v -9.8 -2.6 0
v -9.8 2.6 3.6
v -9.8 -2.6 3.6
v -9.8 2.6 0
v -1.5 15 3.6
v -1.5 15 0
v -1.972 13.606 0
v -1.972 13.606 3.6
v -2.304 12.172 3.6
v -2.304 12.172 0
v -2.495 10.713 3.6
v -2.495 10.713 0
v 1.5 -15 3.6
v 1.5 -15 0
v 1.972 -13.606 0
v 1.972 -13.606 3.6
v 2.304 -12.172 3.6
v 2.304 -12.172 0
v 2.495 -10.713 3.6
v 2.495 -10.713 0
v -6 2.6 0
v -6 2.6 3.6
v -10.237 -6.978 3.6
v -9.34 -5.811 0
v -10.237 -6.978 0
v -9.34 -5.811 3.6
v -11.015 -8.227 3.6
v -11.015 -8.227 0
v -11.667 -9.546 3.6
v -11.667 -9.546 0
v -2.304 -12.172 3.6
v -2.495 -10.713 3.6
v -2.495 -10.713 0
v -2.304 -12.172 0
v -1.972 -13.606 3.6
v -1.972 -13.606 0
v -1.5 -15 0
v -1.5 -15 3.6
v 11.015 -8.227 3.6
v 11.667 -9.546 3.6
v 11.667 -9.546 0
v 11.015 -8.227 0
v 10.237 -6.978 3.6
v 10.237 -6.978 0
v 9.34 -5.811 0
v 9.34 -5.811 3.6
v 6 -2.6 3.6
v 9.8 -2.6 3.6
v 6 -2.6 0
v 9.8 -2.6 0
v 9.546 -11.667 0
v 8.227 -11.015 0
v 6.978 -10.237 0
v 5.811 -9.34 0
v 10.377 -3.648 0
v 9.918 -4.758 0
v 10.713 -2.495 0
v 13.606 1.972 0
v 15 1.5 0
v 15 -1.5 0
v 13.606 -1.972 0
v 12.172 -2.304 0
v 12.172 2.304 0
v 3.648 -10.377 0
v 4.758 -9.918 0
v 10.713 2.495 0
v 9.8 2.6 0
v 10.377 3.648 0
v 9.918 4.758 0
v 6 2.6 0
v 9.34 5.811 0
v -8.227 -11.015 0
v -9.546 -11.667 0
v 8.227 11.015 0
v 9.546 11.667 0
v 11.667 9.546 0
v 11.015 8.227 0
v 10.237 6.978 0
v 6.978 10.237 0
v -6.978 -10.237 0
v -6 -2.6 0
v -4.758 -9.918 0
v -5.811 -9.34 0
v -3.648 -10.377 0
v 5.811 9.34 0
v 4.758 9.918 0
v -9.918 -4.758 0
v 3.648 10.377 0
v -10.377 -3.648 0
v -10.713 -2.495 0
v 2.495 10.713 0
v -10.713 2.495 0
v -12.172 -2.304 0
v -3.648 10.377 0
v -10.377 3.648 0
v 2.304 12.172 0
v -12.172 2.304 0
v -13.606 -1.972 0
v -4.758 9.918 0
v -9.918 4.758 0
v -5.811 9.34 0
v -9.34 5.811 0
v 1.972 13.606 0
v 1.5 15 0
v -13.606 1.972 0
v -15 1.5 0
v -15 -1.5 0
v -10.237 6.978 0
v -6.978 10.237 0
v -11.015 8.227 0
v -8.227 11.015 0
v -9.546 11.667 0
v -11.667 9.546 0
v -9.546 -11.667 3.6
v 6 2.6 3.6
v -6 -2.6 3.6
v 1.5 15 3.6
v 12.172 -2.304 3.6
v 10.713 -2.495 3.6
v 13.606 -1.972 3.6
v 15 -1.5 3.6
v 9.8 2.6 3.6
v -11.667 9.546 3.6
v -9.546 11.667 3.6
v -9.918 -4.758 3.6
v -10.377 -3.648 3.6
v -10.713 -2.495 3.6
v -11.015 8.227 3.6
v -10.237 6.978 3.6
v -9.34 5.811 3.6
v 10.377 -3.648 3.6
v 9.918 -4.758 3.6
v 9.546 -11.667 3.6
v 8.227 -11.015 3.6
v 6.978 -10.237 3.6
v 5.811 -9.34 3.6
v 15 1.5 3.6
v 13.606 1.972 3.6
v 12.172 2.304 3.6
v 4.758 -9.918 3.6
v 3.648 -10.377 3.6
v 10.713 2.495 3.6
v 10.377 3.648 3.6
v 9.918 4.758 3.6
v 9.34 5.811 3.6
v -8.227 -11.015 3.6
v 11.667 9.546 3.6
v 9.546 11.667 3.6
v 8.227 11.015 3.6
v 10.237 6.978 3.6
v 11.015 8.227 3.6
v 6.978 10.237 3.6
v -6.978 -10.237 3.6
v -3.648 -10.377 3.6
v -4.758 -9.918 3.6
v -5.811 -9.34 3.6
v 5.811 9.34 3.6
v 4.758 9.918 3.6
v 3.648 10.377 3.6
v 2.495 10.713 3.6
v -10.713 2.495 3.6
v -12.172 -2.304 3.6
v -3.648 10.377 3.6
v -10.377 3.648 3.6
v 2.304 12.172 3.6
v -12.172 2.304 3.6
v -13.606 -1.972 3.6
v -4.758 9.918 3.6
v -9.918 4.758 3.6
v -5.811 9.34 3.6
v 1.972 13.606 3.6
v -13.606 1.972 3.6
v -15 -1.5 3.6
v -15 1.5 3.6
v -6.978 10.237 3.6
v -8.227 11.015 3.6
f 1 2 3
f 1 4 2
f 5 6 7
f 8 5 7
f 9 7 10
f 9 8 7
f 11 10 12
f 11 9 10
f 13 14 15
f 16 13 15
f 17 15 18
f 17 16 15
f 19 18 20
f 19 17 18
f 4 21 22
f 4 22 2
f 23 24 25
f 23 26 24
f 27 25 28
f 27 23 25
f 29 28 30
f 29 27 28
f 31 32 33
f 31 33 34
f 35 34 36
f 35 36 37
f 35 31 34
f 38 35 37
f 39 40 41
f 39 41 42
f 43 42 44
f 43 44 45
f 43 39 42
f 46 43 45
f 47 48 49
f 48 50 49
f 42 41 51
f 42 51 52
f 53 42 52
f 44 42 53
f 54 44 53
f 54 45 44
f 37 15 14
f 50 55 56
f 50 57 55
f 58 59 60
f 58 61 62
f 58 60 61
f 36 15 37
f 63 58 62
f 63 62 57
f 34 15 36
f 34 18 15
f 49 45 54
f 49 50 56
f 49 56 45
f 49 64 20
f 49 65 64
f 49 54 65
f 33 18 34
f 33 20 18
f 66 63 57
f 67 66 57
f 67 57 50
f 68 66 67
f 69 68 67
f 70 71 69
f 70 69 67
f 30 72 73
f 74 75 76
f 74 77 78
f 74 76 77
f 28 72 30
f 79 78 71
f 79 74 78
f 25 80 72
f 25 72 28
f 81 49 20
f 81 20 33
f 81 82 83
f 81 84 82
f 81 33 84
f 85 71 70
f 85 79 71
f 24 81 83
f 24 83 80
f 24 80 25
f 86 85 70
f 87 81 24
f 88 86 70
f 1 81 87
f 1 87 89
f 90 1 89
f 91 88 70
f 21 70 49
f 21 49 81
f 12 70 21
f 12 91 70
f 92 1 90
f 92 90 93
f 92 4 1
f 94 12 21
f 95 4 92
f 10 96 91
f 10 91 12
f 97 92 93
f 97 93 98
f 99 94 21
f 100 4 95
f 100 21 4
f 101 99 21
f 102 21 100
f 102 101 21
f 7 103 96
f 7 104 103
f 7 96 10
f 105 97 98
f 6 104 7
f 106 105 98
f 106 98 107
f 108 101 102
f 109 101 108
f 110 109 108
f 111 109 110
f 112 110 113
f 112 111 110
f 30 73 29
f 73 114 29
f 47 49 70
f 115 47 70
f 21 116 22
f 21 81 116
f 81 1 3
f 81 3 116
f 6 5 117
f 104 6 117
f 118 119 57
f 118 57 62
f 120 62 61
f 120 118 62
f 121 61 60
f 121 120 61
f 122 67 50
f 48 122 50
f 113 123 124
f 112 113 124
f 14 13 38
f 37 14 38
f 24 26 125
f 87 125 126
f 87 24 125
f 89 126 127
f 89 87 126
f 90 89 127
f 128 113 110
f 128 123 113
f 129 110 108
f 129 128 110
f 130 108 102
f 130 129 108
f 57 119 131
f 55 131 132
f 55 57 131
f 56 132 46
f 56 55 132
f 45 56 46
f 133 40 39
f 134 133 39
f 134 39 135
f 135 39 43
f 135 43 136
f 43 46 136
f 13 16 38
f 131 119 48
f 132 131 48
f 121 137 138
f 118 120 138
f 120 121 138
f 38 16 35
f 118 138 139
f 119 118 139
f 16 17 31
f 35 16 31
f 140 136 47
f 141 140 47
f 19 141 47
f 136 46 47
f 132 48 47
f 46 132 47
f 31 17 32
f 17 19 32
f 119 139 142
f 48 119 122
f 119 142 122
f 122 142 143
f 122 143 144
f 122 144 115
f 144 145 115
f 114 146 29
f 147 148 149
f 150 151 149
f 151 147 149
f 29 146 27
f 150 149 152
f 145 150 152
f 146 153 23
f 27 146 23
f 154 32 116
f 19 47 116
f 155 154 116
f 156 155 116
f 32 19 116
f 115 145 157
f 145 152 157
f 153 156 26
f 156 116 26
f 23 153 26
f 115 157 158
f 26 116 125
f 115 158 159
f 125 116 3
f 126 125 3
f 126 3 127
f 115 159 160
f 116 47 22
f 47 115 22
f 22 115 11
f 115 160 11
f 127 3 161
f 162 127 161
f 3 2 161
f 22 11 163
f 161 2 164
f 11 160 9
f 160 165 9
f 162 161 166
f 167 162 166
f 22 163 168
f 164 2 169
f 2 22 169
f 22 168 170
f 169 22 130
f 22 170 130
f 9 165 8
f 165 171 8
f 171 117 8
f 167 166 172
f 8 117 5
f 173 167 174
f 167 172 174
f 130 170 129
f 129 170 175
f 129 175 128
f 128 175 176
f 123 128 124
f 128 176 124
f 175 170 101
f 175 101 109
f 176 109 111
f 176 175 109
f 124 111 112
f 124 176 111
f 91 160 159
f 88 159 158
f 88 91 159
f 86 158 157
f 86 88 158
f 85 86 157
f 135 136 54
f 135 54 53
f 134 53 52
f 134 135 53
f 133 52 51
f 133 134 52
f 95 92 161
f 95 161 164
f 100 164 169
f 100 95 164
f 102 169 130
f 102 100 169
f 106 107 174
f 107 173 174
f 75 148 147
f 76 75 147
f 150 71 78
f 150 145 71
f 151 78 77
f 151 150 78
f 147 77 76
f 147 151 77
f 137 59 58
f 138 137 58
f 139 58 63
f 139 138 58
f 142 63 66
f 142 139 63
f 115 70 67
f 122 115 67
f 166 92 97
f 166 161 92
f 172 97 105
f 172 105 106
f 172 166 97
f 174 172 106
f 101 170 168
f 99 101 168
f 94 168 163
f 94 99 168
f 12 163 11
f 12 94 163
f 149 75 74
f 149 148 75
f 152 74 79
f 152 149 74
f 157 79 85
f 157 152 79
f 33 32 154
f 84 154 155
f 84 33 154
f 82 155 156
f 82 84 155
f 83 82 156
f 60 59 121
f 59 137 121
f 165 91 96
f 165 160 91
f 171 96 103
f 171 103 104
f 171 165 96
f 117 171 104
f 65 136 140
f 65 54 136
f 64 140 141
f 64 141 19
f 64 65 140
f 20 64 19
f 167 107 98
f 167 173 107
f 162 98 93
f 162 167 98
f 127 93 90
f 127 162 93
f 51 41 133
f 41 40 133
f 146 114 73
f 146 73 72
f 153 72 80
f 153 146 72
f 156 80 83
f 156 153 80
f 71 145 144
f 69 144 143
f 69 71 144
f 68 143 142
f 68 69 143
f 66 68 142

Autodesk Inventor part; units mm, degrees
ref_plane "YZ Plane" through (0, 0, 0) normal (1, 0, 0) x (0, 1, 0)
ref_plane "XZ Plane" through (0, 0, 0) normal (0, 1, 0) x (-1, 0, 0)
ref_plane "XY Plane" through (0, 0, 0) normal (0, 0, 1) x (1, 0, 0)
ref_plane "Work Plane1" through (0, 0, 0) normal (0, 0, -1) x (-1, 0, 0)
sketch "Sketch3" plane through (0, 0, 0) normal (0, 0, -1) x (-1, 0, 0)
  circle A0 centre (0, 0) radius 11
  line L0 (-15.4, 0) -> (15.4, 0) projected
  dimension "d19" = 22
extrude "Extrusion3" add sketch "Sketch3" against normal blind 3.6
sketch "Sketch4" plane through (0, 0, 3.6) normal (0, 0, 1) x (1, 0, 0)
  arc A0 (10.6524, -2.5) -> (10.6524, 2.5) centre (0, 0) ccw
  line L0 (-16.2075, 0) -> (20.2449, 0) projected
  line L1 (15, 0) -> (15, 1.5)
  arc A1 (15, 1.5) -> (10.6524, 2.5) centre (9.5012, -12.4558) ccw
  line L2 (15, 0) -> (15, -1.5)
  arc A2 (10.6524, -2.5) -> (15, -1.5) centre (9.5012, 12.4558) ccw
  dimension "d22" = 1.5
  dimension "d23" = 2.5
  dimension "d24" = 15
  dimension "d25" = 15
extrude "Extrusion4" add sketch "Sketch4" against normal blind 3.6
sketch "Sketch2" plane through (0, 0, 0) normal (0, 0, -1) x (-1, 0, 0)
  line L0 (-9.8, -2.6) -> (-6, -2.6)
  line L1 (-6, -2.6) -> (-6, 2.6)
  line L2 (-6, 2.6) -> (-9.8, 2.6)
  line L3 (-9.8, 2.6) -> (-9.8, -2.6)
  line L4 (-9.8, -2.6) -> (-6, 2.6) construction
  line L5 (-6, -2.6) -> (-9.8, 2.6) construction
  line L6 (0, -27.5637) -> (0, 32.5752)
  line L7 (9.8, -2.6) -> (6, -2.6)
  line L8 (6, -2.6) -> (6, 2.6)
  line L9 (6, 2.6) -> (9.8, 2.6)
  line L10 (9.8, 2.6) -> (9.8, -2.6)
  line L11 (9.8, -2.6) -> (6, 2.6) construction
  line L12 (6, -2.6) -> (9.8, 2.6) construction
  point P0 (-7.9, 0)
  point P1 (7.9, 0)
  point P2 (0, 0)
  dimension "d11" = 3.8
  dimension "d12" = 5.2
  dimension "d31" = 6
  dimension "d32" = 0
extrude "Extrusion2" cut sketch "Sketch2" against normal blind 3.6
pattern_circular "Circular Pattern1" count 8 over 360 about axis through (0, 0, 0) along (0, 0, 1) of "Extrusion4"
properties part number "tandwiel(ja)"
